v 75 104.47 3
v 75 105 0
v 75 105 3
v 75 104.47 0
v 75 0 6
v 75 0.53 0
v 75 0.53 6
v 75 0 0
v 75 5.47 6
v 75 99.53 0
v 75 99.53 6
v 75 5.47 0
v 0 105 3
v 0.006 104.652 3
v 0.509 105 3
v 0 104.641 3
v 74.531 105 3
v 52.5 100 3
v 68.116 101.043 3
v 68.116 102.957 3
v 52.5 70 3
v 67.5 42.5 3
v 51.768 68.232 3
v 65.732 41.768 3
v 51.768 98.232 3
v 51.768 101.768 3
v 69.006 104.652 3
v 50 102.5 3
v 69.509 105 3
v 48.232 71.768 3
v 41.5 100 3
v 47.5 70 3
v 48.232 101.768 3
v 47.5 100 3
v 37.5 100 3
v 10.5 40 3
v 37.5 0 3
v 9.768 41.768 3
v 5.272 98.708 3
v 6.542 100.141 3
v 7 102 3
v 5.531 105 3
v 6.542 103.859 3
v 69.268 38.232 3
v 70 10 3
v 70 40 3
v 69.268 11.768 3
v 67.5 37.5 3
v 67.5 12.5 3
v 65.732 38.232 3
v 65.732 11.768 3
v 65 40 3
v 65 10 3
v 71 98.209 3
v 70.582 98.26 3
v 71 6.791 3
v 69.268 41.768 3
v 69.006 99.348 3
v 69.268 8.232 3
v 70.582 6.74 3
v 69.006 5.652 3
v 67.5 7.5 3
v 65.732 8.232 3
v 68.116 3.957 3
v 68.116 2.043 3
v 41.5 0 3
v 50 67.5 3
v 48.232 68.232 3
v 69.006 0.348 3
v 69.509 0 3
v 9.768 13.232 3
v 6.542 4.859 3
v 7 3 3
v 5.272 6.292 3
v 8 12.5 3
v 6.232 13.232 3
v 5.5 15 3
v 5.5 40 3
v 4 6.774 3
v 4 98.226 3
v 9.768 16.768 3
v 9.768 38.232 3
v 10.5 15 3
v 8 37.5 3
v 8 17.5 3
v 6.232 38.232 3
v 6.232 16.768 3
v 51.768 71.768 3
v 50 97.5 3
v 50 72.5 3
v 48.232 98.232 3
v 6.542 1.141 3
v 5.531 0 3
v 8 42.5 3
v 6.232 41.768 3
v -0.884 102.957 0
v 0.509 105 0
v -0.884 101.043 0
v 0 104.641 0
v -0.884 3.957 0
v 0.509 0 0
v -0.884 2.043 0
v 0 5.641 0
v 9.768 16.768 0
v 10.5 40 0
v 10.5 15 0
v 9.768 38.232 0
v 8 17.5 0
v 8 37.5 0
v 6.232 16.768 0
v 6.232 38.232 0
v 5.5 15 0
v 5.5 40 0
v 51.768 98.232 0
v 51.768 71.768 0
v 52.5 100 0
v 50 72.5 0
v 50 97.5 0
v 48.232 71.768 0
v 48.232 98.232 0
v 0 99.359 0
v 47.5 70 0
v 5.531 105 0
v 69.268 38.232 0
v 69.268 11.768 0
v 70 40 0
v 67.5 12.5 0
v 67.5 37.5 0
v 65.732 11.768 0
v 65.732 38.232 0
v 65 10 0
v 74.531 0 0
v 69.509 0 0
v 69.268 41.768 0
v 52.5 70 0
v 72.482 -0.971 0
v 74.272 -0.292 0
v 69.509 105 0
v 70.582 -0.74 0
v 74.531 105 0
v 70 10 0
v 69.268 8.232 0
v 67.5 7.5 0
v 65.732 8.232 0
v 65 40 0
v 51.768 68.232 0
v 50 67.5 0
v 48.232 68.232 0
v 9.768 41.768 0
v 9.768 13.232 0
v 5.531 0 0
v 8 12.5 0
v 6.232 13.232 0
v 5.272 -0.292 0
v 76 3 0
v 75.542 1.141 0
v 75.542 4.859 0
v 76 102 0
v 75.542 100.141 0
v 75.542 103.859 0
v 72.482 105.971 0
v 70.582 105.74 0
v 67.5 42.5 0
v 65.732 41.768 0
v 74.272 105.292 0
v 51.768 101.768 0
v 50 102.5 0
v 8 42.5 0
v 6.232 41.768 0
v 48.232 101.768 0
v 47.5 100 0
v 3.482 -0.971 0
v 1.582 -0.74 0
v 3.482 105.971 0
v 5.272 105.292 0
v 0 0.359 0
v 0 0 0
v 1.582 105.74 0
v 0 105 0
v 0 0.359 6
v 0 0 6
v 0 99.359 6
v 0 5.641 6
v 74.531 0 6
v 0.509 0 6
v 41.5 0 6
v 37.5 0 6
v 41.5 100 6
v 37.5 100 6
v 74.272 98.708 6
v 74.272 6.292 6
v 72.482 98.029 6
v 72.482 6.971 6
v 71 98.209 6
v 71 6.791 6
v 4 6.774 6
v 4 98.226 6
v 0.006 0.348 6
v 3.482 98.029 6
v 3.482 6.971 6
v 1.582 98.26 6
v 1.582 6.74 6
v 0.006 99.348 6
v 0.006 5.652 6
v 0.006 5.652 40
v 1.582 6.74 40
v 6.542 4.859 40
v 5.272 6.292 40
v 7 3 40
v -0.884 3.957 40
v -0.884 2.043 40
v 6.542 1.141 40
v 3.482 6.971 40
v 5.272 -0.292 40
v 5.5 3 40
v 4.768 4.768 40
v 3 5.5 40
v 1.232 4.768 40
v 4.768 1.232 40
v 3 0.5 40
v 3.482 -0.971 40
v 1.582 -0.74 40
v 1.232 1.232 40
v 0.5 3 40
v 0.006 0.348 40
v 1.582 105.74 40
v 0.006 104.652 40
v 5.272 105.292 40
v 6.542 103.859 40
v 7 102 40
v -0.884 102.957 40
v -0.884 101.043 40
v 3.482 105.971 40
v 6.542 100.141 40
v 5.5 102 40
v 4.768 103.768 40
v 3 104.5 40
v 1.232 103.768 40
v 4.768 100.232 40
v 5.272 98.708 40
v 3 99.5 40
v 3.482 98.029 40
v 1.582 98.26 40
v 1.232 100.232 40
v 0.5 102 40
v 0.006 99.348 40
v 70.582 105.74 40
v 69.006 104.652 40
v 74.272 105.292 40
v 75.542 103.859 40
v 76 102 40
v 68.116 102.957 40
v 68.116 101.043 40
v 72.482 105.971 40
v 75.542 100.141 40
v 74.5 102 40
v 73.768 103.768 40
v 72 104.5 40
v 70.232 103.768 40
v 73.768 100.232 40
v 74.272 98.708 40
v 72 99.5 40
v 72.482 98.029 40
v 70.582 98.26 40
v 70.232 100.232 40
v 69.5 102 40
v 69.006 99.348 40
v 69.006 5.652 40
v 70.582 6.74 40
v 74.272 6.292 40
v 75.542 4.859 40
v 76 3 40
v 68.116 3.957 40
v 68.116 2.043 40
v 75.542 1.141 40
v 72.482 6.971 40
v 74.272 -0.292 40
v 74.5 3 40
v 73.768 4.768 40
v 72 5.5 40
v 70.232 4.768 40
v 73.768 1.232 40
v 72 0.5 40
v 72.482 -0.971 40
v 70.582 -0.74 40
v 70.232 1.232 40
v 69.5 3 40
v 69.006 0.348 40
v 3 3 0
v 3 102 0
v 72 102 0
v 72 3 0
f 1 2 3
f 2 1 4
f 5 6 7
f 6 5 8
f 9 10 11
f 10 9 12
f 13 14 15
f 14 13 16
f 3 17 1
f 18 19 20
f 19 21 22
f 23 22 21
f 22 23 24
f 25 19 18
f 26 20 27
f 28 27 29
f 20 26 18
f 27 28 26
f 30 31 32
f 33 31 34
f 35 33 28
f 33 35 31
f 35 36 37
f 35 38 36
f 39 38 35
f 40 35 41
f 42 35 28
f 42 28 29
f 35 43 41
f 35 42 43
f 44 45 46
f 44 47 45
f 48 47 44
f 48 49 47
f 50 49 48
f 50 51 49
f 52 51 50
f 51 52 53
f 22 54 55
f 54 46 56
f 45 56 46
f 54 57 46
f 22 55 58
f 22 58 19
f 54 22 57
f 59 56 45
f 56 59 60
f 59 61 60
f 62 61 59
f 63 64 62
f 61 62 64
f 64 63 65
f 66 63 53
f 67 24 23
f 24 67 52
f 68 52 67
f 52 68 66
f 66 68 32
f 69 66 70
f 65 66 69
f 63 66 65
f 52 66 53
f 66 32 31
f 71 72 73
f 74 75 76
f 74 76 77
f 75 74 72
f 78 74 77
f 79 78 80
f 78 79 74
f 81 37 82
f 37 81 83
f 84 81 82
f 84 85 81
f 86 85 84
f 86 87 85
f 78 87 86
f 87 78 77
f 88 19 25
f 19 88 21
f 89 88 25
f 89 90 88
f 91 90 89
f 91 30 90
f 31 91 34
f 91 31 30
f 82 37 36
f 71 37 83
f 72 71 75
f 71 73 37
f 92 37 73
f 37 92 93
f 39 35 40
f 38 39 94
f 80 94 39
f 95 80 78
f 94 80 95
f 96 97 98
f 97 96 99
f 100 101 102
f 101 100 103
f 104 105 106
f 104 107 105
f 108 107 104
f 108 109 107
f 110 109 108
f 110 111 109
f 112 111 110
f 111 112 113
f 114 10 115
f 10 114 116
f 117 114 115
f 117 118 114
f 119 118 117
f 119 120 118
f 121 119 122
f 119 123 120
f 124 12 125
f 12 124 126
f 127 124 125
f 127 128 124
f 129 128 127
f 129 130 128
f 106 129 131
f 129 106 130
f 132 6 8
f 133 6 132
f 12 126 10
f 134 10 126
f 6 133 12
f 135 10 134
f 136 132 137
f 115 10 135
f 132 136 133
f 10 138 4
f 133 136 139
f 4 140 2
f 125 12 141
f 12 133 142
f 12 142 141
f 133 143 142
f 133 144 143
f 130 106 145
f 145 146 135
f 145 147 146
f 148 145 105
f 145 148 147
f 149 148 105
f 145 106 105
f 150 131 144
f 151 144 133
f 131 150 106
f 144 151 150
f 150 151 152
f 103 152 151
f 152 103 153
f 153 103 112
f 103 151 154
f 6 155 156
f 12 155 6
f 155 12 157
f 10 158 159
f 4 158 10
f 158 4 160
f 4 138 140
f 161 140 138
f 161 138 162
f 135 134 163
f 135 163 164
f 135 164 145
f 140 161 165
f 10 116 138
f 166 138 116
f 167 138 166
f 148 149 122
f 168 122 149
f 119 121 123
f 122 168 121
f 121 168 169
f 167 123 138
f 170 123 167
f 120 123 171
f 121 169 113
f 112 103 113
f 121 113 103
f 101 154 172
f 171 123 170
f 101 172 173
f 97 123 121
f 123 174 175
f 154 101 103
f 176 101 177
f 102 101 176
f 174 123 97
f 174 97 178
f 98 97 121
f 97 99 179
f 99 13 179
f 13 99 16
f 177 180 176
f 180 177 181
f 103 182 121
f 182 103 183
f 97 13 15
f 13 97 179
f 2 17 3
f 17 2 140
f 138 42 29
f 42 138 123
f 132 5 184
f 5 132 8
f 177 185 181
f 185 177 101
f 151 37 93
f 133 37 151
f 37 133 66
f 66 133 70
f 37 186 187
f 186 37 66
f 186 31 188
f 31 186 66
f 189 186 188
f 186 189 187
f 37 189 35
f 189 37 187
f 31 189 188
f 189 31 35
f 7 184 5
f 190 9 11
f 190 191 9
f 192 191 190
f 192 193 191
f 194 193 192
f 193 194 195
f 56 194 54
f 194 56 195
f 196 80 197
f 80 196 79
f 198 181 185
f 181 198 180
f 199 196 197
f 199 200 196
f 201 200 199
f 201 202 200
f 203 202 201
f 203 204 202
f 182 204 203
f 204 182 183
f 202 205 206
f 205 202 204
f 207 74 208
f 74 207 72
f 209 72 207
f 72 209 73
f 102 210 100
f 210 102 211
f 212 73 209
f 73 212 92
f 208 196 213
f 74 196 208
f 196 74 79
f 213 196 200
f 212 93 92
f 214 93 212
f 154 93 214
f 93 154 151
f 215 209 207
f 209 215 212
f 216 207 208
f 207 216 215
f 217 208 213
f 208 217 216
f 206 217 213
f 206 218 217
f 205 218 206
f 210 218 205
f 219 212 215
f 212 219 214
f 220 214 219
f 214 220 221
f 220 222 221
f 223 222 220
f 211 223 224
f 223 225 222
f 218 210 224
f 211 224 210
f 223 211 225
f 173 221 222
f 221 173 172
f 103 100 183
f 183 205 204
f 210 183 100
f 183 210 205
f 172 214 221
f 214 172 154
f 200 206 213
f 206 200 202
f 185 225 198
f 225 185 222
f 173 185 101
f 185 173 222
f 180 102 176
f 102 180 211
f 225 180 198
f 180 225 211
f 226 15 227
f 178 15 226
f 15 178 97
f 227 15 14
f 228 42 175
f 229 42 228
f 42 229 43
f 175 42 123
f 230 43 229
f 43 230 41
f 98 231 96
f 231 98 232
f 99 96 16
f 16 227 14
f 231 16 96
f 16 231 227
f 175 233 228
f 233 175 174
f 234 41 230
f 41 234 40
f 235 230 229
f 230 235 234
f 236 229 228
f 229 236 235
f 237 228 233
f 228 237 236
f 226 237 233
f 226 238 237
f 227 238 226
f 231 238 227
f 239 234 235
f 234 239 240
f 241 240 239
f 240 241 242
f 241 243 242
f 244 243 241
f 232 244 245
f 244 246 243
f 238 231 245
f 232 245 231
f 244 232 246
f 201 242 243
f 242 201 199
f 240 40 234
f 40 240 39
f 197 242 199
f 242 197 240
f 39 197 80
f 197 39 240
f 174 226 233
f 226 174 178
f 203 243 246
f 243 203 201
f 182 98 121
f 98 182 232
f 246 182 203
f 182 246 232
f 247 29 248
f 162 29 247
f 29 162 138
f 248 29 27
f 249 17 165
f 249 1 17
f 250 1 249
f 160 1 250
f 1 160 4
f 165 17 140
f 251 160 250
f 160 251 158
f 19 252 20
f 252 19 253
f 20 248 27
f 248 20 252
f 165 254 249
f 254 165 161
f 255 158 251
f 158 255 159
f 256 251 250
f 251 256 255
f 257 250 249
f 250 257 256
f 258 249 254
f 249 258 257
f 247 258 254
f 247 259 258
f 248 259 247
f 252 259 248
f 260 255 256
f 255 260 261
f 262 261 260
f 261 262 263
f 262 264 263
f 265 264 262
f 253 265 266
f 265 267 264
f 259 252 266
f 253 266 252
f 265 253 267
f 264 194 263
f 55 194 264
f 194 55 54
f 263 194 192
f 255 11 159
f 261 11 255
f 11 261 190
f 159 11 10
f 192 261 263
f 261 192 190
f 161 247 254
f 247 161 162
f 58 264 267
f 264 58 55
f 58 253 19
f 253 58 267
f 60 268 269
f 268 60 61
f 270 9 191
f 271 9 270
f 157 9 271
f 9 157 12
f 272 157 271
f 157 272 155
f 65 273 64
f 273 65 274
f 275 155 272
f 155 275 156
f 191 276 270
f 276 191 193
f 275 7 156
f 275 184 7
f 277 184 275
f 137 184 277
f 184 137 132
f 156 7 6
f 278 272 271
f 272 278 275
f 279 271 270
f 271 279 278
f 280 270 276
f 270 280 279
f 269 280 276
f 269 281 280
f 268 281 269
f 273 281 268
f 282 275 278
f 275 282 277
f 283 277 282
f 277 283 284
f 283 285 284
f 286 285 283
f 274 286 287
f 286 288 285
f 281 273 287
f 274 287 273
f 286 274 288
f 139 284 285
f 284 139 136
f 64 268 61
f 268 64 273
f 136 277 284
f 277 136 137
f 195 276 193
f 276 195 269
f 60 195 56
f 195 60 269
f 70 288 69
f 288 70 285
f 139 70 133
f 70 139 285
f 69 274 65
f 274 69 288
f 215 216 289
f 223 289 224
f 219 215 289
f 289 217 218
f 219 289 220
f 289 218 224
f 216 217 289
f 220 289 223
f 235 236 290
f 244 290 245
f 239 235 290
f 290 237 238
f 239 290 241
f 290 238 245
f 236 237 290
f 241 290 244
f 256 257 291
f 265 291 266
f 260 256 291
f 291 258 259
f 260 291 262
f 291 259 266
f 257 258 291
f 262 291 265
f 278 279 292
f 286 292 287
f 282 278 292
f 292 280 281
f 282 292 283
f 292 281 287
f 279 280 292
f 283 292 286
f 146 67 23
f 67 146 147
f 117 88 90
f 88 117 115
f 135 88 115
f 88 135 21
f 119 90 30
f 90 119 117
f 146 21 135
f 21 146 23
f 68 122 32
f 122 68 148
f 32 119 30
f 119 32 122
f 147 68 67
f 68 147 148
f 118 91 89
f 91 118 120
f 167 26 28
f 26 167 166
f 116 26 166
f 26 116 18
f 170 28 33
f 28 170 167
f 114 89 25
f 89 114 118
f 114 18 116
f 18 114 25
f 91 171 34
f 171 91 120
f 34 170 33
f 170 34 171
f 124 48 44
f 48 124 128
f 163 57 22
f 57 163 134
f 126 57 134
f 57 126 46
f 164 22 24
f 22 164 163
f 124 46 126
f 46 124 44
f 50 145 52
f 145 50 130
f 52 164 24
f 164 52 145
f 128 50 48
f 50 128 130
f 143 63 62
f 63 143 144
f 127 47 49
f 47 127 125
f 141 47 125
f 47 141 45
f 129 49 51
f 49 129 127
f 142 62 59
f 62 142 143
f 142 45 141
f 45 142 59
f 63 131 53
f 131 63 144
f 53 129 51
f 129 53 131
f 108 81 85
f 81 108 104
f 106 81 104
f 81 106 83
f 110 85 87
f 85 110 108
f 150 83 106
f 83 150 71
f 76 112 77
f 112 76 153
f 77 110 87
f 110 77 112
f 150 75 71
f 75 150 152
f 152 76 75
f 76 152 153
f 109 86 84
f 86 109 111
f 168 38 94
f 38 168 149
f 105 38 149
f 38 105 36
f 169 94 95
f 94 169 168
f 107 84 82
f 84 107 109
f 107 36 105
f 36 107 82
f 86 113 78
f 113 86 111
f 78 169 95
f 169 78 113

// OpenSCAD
module drawBase() { 
difference() {
    union() {
        cube([75,105,3]);
        //support
        translate([37.5,0,2])cube([4,100,4]);
        translate([71,0,2])cube([4,100,4]);
        translate([0,0,2])cube([4,100,4]);
        //standoffs
        translate([3,3,0])cylinder(40,4,4);
        translate([3,102,0])cylinder(40,4,4);
        translate([72,102,0])cylinder(40,4,4);
        translate([72,3,0])cylinder(40,4,4);
    }
    //standoff holess
    translate([3,3,0])cylinder(40,0,2.5);
    translate([3,102,0])cylinder(40,0,2.5);
    translate([72,102,0])cylinder(40,0,2.5);
    translate([72,3,0])cylinder(40,0,2.5);
    //back hole 
    //translate([30,10,0])cylinder(4,3,3);
    // translate([50,10,0])cylinder(4,3,3);
    translate([50,70,0])cylinder(4,2.5,2.5);
    translate([50,100,0])cylinder(4,2.5,2.5);
    translate([67.5,40,0])cylinder(4,2.5,2.5);
    translate([67.5,10,0])cylinder(4,2.5,2.5);
    translate([8,15,0])cylinder(4,2.5,2.5);
    translate([8,40,0])cylinder(4,2.5,2.5);
}
}

drawBase();
